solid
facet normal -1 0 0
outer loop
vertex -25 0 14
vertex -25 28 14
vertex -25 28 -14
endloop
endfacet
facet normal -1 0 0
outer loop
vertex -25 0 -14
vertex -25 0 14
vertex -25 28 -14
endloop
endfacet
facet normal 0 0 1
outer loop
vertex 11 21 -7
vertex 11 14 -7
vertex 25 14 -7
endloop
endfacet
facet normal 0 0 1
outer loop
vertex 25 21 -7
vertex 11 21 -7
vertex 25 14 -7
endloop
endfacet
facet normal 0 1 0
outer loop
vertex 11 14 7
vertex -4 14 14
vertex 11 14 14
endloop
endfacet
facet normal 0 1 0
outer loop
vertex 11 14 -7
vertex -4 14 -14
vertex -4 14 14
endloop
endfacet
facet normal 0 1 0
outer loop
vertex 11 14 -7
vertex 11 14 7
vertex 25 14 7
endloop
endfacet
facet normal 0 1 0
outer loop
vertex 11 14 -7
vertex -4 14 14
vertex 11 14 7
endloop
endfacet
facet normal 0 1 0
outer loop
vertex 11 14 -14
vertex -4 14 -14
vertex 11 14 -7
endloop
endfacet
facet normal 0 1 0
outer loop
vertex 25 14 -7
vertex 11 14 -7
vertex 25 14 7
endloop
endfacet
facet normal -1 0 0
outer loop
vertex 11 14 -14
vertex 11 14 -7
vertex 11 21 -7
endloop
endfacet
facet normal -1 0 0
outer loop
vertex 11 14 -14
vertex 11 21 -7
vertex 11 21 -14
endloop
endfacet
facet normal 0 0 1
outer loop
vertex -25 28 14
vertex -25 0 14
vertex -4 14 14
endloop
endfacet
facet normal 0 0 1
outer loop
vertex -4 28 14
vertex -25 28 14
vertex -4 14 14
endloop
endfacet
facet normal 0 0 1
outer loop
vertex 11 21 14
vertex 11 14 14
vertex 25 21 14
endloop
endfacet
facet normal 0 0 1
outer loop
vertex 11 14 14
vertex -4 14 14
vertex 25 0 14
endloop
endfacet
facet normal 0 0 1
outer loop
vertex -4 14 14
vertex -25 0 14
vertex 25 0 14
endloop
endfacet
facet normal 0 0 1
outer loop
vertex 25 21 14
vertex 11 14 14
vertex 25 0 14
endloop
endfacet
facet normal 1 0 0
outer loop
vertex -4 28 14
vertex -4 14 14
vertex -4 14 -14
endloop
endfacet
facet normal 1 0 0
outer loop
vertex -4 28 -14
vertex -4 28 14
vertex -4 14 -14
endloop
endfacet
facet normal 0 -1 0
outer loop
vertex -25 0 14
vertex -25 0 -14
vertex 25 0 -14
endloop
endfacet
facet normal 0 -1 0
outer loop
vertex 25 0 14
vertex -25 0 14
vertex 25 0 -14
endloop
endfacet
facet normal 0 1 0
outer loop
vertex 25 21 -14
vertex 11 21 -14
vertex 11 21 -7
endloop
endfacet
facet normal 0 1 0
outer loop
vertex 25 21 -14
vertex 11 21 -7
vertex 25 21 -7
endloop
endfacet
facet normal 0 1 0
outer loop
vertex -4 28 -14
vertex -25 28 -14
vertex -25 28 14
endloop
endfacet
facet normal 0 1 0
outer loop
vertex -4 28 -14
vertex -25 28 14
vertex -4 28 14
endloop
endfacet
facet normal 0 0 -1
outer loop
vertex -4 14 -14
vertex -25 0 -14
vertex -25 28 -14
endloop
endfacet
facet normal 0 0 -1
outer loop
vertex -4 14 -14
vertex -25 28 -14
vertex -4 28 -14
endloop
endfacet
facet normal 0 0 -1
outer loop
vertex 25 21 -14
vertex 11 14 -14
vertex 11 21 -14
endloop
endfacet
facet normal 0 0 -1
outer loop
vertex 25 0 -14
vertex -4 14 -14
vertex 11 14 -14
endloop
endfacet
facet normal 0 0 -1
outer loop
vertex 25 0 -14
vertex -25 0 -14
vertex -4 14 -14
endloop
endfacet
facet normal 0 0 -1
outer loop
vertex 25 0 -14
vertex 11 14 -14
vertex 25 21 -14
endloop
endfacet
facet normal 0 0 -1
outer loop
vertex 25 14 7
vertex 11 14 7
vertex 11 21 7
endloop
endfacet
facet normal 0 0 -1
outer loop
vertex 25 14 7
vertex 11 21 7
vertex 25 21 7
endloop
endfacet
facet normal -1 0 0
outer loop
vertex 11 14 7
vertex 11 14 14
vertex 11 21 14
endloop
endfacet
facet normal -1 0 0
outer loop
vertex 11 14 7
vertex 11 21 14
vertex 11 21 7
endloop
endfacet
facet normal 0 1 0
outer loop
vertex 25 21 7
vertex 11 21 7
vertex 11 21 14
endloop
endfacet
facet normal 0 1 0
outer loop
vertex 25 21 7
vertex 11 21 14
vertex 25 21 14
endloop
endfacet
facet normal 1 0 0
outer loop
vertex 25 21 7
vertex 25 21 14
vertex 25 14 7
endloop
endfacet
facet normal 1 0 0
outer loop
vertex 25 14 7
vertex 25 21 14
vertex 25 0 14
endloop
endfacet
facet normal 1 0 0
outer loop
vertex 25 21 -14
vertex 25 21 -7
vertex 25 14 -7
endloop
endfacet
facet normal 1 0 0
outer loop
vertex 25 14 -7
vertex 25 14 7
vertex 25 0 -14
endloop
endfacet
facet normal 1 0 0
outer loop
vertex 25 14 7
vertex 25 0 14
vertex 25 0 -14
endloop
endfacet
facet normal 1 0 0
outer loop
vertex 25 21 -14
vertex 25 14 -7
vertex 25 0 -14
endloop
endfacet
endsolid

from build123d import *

# Parameters (mm, degrees)
BOSS_EXTRUDE1_DEPTH = 14
SKETCH1_3_W         = 21
SKETCH1_3_H         = 28
BOSS_EXTRUDE2_DEPTH = 28
SKETCH1_4_W         = 14
SKETCH1_4_H         = 7
BOSS_EXTRUDE3_DEPTH = 21


with BuildPart() as part:
    # Sketch1 → Boss-Extrude1 (new body)
    with BuildSketch(Plane(origin=(0, 0, 0), x_dir=(1, 0, 0), z_dir=(0, 1, 0))):
        Polygon((11, 14), (-4, 14), (-4, -14), (11, -14), (11, -7), (25, -7), (25, 7), (11, 7), align=None)
    extrude(amount=BOSS_EXTRUDE1_DEPTH)

    # Sketch1<3> → Boss-Extrude2 (add)
    with BuildSketch(Plane(origin=(0, 0, 0), x_dir=(1, 0, 0), z_dir=(0, 1, 0))):
        with Locations((-14.5, 0)):
            Rectangle(SKETCH1_3_W, SKETCH1_3_H)
    extrude(amount=BOSS_EXTRUDE2_DEPTH)

    # Sketch1<4> → Boss-Extrude3 (add)
    with BuildSketch(Plane(origin=(0, 0, 0), x_dir=(1, 0, 0), z_dir=(0, 1, 0))):
        with Locations((18, -10.5)):
            Rectangle(SKETCH1_4_W, SKETCH1_4_H)
        with Locations((18, 10.5)):
            Rectangle(SKETCH1_4_W, SKETCH1_4_H)
    extrude(amount=BOSS_EXTRUDE3_DEPTH)


solid = part.part
